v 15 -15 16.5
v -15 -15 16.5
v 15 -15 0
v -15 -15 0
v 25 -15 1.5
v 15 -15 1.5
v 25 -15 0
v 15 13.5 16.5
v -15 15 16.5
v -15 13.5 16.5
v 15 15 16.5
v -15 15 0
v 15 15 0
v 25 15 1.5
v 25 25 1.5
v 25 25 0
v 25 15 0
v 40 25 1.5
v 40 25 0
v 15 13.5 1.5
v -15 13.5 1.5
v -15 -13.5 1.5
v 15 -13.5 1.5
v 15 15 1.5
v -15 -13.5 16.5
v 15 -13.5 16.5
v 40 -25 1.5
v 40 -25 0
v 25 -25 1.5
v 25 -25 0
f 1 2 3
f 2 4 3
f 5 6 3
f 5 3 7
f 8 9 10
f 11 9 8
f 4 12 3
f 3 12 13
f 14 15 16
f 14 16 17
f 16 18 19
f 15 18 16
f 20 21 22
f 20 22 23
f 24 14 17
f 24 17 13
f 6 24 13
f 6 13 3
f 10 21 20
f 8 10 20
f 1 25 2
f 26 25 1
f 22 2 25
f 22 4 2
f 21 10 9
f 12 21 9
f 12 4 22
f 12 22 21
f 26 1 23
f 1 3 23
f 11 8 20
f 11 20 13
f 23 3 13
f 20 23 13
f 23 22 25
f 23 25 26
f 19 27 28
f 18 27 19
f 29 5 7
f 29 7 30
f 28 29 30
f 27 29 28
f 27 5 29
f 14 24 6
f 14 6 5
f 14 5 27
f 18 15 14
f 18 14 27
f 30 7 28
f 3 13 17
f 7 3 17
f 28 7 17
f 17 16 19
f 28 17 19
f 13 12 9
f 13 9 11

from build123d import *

# Parameters (mm, degrees)
F0_W     = 30.0000150987
F0_H     = 30
F1_DEPTH = 1.5
F3_DEPTH = 1.5
F4_W     = 30.0000150987
F4_H     = 1.5
F5_DEPTH = 15
F6_W     = 30.0000150987
F6_H     = 1.5
F7_DEPTH = 15


with BuildPart() as f1:
    # F0 (on Top) → F1 (new body)
    with BuildSketch(Plane.XY):
        Rectangle(F0_W, F0_H)
    extrude(amount=F1_DEPTH)

    # F4 (on face) → F5 (join)
    with BuildSketch(Plane.XY.offset(1.5)):
        with Locations((0, 14.25)):
            Rectangle(F4_W, F4_H)
    extrude(amount=F5_DEPTH)

    # F6 (on face) → F7 (join)
    with BuildSketch(Plane.XY.offset(1.5)):
        with Locations((0, -14.25)):
            Rectangle(F6_W, F6_H)
    extrude(amount=F7_DEPTH)


with BuildPart() as f3:
    # F2 (on face) → F3 (new body)
    with BuildSketch(Plane.XY.offset(1.5)):
        Polygon((25.0000075493, 15), (15.0000075493, 15), (15.0000075493, -15), (25.0000075493, -15), (25.0000075493, -25), (40.0000075493, -25), (40.0000075493, 25), (25.0000075493, 25), align=None)
    extrude(amount=-F3_DEPTH)


solid = Compound([f1.part, f3.part])
